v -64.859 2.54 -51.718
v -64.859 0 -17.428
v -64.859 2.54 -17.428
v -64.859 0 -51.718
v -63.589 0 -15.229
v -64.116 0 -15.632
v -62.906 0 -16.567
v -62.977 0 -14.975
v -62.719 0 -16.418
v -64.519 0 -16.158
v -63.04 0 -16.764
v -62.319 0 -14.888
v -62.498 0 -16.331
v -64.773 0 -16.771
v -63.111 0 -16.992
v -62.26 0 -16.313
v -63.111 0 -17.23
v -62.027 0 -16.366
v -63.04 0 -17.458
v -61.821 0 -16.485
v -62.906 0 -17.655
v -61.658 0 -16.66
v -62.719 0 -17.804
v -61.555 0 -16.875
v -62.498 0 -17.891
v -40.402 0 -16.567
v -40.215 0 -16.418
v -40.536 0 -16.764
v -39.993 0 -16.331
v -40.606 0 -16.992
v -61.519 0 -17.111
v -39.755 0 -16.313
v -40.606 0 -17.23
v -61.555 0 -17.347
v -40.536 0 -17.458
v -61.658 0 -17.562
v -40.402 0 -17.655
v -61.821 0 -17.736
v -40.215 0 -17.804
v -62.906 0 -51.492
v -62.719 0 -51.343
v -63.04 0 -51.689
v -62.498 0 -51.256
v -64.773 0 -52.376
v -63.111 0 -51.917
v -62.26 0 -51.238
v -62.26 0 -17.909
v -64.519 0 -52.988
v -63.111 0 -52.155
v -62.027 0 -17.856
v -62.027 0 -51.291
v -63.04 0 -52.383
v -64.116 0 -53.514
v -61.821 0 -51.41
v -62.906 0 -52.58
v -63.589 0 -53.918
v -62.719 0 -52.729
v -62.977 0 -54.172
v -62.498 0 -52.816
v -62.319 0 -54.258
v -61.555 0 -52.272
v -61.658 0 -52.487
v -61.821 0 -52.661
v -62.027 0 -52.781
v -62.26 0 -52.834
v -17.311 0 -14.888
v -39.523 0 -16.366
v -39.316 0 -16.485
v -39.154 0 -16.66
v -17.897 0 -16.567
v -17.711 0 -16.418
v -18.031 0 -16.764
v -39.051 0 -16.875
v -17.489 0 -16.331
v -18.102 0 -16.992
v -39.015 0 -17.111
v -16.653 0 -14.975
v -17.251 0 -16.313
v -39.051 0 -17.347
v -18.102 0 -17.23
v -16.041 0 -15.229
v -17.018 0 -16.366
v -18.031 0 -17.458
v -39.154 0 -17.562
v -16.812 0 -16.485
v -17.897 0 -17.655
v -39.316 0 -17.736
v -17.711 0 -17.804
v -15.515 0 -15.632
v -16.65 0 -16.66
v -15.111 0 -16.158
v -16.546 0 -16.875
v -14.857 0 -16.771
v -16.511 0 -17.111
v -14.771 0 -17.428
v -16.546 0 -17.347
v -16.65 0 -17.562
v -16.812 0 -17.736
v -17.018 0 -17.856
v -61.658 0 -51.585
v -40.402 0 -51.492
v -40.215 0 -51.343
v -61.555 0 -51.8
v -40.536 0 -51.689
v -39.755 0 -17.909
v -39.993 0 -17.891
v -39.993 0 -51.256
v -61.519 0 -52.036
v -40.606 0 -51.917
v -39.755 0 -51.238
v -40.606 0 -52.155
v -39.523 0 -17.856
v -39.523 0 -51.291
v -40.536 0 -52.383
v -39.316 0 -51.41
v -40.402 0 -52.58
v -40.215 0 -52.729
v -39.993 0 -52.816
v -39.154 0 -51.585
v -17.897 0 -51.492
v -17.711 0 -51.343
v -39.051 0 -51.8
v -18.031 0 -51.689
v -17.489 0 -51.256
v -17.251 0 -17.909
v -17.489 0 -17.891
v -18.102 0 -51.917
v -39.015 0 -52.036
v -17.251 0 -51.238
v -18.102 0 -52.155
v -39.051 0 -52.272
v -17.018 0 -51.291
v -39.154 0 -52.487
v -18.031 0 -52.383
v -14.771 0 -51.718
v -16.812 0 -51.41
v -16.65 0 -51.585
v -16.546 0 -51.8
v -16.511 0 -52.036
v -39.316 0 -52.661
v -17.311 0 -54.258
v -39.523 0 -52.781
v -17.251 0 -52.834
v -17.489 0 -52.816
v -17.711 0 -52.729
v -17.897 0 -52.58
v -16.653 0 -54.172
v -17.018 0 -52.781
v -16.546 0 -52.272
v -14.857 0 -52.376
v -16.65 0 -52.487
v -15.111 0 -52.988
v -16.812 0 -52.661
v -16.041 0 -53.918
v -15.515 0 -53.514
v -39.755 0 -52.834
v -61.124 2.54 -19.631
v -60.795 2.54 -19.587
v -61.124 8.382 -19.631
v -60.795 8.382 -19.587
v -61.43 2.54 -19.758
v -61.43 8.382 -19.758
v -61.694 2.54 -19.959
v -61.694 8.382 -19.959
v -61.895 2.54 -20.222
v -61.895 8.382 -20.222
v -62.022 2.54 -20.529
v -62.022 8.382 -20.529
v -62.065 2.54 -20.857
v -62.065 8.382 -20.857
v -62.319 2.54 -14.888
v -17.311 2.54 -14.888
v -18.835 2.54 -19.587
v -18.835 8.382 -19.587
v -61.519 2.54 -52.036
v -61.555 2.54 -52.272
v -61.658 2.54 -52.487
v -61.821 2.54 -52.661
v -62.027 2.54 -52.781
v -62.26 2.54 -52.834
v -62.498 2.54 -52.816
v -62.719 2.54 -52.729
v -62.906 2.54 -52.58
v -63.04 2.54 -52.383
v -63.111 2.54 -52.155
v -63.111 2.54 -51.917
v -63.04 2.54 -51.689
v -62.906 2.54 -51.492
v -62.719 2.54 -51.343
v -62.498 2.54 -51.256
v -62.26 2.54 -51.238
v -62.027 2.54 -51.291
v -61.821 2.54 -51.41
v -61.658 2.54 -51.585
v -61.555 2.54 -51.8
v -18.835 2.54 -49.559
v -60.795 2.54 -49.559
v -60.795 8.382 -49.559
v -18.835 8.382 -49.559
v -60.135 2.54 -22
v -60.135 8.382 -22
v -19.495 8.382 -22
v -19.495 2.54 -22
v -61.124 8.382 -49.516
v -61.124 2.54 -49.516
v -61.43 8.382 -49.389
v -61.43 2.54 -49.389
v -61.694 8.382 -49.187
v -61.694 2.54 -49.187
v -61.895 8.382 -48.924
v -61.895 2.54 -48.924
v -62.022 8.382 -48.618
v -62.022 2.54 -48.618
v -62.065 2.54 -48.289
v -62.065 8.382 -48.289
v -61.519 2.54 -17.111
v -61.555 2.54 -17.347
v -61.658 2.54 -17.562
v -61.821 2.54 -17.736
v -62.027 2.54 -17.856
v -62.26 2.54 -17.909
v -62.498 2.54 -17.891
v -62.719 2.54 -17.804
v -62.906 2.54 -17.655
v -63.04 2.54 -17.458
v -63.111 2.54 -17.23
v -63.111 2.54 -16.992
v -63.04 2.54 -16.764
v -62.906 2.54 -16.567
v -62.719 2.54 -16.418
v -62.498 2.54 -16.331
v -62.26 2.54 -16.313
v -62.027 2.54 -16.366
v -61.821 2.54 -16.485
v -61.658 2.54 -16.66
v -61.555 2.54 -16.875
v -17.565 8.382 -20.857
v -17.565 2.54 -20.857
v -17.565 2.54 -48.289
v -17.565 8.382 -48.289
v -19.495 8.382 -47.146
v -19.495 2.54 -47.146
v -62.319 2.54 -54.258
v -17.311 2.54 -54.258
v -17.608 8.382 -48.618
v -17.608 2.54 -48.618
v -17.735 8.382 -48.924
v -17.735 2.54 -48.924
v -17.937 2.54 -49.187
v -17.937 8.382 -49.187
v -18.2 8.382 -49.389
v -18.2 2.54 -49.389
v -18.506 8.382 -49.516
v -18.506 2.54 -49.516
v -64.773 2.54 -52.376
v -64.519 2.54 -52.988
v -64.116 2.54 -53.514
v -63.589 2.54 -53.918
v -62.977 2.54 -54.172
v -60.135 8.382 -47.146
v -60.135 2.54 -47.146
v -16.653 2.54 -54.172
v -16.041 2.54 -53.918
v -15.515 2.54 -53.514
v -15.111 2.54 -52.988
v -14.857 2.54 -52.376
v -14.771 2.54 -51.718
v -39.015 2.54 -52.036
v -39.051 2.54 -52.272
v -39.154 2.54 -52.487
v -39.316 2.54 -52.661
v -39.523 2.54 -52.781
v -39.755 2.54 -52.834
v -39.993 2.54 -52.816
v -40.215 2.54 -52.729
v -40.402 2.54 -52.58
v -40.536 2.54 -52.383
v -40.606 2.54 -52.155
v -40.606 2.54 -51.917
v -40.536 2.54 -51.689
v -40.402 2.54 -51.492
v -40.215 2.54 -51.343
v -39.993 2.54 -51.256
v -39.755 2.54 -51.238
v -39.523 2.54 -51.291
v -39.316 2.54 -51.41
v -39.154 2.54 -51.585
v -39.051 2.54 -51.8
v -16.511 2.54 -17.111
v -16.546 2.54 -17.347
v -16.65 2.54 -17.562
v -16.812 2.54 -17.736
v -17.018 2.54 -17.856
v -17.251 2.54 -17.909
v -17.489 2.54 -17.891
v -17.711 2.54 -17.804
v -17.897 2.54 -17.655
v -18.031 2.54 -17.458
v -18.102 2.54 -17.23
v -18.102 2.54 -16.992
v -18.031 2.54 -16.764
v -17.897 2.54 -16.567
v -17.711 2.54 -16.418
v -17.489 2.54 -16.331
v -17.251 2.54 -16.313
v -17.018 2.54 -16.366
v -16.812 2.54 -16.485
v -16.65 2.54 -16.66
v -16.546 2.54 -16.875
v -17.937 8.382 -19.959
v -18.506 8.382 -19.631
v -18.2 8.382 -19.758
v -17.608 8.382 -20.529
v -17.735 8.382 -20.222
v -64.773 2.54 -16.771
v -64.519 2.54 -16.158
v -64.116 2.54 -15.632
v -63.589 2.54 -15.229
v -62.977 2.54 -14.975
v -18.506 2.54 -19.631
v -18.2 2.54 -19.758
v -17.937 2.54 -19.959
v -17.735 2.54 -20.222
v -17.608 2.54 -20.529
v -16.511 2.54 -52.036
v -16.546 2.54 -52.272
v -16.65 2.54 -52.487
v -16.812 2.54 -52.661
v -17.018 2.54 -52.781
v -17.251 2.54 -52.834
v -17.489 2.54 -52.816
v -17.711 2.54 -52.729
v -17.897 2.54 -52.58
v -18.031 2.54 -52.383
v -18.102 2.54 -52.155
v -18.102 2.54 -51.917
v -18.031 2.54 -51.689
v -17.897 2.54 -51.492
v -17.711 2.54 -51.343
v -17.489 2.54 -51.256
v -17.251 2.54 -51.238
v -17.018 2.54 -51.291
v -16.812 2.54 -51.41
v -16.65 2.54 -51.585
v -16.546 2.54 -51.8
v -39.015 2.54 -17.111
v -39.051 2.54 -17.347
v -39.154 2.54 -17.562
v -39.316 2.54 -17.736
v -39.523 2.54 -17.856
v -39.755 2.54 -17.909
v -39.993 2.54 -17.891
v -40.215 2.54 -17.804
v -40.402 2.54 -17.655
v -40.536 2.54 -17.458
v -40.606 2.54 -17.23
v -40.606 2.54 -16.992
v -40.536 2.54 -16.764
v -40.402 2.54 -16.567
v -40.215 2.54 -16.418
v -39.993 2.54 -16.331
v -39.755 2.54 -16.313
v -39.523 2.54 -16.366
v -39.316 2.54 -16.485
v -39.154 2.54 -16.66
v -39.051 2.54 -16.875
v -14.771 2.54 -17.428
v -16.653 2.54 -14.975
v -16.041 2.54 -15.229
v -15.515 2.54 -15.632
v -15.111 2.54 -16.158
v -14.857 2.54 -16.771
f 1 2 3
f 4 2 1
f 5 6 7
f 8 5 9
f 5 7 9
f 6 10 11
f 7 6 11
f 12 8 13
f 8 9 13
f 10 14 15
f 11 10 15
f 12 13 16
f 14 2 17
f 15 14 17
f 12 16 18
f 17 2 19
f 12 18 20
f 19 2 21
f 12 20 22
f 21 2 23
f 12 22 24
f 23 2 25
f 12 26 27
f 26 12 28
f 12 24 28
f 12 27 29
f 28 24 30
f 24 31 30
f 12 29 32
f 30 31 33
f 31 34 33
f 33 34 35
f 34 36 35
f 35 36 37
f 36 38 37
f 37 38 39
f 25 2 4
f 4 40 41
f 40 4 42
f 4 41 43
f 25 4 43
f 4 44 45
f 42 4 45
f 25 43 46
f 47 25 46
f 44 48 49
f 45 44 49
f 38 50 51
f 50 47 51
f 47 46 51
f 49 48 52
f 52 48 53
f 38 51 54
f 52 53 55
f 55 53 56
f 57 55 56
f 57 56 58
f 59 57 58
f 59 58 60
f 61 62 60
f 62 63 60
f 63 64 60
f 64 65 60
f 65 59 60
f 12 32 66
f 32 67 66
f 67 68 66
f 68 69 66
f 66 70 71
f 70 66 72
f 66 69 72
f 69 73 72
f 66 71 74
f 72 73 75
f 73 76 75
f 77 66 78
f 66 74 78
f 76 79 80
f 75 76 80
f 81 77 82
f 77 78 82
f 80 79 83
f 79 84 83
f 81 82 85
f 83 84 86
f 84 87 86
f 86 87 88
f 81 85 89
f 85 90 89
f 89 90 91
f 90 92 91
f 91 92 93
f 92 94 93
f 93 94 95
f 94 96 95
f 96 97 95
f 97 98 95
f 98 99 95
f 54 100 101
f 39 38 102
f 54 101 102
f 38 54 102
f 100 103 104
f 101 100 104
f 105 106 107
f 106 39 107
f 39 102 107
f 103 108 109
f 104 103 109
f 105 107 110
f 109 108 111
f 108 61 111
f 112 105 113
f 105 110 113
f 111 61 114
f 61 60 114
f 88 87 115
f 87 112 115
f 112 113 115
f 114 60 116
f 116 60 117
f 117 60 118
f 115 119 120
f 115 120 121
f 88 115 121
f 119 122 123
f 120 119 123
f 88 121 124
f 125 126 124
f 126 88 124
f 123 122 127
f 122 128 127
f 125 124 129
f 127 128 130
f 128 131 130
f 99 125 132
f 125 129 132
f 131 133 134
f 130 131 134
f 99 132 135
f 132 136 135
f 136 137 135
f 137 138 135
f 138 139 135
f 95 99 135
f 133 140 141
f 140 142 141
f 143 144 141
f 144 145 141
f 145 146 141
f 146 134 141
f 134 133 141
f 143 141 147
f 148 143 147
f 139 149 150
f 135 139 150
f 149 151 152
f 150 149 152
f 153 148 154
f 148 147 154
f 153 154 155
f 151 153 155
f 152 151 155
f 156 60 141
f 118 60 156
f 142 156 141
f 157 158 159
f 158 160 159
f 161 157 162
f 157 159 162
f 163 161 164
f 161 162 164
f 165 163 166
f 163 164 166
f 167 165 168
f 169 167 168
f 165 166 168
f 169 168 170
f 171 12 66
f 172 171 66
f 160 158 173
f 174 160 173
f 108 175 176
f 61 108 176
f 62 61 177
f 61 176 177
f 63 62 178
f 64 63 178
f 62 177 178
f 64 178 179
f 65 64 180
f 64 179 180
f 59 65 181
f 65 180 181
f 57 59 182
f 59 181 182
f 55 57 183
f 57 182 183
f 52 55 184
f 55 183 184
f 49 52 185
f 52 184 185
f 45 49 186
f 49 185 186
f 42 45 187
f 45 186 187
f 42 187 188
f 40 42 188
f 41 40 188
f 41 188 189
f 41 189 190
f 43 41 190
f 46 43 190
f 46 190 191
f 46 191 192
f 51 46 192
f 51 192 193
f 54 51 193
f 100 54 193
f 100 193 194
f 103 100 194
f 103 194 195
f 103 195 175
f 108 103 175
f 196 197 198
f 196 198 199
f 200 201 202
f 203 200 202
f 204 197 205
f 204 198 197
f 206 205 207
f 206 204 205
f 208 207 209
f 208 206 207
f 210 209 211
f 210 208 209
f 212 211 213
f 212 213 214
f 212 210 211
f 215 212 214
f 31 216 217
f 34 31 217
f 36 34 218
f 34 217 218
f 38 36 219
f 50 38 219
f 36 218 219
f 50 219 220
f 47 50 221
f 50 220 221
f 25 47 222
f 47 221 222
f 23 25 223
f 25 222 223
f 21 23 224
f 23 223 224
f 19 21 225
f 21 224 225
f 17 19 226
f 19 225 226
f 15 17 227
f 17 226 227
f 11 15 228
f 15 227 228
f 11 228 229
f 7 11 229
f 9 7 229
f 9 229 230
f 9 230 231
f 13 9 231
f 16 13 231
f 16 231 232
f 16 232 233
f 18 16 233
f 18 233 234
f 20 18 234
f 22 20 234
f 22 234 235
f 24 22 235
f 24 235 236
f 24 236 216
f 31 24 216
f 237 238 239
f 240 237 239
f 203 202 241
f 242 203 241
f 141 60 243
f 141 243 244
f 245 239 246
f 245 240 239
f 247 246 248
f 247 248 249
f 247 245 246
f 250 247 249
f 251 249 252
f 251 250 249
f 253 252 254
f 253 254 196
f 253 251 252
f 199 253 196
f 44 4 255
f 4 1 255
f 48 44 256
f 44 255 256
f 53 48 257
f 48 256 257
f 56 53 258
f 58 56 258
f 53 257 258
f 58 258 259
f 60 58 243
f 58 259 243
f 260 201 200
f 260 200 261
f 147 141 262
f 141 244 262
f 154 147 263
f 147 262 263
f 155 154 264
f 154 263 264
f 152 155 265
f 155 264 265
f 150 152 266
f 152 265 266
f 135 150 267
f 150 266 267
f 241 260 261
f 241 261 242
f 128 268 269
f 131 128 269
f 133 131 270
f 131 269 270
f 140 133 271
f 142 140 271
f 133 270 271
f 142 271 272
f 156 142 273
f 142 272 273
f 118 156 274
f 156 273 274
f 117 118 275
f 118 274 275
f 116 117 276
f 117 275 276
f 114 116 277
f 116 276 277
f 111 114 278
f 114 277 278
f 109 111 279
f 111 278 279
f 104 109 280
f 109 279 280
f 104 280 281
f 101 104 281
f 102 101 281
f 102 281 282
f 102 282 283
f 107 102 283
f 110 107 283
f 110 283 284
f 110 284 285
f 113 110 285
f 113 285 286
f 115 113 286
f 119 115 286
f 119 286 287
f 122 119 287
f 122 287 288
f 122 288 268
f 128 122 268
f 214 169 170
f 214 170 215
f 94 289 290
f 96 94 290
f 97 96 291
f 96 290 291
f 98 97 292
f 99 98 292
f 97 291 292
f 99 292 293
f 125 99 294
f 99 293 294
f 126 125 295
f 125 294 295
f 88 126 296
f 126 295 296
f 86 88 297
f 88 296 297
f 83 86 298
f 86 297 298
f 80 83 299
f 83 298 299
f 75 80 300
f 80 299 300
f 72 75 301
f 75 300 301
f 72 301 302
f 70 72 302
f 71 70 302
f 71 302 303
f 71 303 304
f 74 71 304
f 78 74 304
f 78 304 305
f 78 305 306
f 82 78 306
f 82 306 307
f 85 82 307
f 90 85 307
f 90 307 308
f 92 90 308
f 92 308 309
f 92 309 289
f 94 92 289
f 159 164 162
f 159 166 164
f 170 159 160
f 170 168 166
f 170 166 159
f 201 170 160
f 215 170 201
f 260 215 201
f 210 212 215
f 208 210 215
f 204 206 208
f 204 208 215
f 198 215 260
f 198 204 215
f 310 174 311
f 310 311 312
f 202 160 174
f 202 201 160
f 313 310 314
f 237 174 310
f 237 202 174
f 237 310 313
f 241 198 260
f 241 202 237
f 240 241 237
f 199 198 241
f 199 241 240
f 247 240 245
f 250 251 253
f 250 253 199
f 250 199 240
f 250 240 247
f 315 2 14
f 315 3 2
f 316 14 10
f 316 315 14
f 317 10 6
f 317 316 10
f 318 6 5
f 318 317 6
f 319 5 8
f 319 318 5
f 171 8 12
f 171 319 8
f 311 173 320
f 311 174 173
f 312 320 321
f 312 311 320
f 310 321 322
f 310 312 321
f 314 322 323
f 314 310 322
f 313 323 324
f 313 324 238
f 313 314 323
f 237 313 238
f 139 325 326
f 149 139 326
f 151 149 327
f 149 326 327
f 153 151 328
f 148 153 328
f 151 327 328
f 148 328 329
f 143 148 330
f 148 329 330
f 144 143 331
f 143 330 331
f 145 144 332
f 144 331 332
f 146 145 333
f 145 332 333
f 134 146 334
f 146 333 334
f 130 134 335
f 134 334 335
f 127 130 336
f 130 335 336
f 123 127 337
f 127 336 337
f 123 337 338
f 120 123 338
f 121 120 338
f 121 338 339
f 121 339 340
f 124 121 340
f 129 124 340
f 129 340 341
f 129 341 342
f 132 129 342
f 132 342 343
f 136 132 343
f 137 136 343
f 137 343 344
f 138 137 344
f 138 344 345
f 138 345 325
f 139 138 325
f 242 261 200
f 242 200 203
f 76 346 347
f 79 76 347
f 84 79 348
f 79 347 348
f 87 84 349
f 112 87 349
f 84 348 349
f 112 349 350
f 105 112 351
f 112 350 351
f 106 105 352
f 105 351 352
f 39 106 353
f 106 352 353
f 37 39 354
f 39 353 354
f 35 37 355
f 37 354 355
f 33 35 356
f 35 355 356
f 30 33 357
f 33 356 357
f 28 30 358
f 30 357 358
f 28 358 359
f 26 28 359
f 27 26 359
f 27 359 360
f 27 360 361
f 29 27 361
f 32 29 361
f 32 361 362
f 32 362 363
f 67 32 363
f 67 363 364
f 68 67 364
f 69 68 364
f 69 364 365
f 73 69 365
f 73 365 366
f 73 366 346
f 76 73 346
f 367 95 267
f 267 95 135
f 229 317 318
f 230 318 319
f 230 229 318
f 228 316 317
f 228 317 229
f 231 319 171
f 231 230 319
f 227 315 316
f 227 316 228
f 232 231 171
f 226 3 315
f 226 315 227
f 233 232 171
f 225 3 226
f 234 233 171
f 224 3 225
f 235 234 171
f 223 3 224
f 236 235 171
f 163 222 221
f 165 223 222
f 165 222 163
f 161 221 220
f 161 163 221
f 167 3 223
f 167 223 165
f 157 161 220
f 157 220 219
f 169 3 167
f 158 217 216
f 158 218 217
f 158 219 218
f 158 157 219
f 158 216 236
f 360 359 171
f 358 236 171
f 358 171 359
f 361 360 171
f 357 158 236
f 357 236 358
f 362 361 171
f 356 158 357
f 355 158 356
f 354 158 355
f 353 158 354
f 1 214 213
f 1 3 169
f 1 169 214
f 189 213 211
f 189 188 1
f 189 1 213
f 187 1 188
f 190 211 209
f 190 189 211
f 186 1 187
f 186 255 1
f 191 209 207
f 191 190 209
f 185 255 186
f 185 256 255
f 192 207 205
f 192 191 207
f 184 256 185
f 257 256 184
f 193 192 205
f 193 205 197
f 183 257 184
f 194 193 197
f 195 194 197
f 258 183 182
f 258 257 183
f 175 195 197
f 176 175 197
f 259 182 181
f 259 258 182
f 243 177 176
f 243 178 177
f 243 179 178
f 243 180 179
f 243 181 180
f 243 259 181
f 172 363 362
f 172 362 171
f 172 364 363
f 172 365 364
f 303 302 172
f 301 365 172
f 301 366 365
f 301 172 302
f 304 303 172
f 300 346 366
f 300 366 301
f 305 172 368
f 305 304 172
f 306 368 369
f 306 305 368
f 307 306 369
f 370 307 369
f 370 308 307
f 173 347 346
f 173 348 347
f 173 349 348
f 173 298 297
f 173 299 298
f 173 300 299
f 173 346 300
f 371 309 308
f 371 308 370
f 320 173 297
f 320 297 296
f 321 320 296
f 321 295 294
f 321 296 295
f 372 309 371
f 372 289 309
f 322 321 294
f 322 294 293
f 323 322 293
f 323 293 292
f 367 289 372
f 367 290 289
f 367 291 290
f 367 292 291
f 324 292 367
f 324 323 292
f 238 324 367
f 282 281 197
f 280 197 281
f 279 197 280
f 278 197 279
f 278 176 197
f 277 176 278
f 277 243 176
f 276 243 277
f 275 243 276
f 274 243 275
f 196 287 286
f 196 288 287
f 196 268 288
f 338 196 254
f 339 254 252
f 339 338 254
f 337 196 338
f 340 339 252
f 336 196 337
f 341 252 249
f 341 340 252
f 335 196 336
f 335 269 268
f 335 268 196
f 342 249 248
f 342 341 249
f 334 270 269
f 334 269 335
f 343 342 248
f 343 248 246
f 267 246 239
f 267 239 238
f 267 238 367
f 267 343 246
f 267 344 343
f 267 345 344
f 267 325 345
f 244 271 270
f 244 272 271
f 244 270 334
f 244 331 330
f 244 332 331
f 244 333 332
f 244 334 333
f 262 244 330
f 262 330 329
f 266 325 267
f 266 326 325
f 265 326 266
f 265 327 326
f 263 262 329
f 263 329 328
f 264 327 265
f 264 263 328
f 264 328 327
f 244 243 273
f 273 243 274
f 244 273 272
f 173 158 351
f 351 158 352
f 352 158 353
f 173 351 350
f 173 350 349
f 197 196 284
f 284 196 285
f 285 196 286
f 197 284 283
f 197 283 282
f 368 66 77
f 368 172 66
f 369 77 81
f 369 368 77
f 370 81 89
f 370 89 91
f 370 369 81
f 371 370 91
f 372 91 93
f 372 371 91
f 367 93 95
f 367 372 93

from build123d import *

# Parameters (mm, degrees)
SKETCH1_W                  = 50.0888
SKETCH1_H                  = 39.37
BOSS_EXTRUDE1_DEPTH        = 2.54
SKETCH2_W                  = 44.5008
SKETCH2_H                  = 29.972
BOSS_EXTRUDE2_DEPTH        = 5.842
FILLET1_R                  = 2.54
FILLET2_R                  = 1.27
F_1_6_1_6_DIAMETER_HOLE1_D = 1.6
SKETCH5_W                  = 40.64
SKETCH5_H                  = 25.146
CUT_EXTRUDE1_DEPTH         = 5.842


with BuildPart() as part:
    # Sketch1 → Boss-Extrude1 (new body)
    with BuildSketch(Plane(origin=(0, 0, 0), x_dir=(1, 0, 0), z_dir=(0, 1, 0))):
        with Locations((-39.815086883, 34.57343553)):
            Rectangle(SKETCH1_W, SKETCH1_H)
    extrude(amount=BOSS_EXTRUDE1_DEPTH)

    # Sketch2 → Boss-Extrude2 (add)
    with BuildSketch(Plane(origin=(0, 2.54, 0), x_dir=(1, 0, 0), z_dir=(0, 1, 0))):
        with Locations((-39.815086883, 34.57343553)):
            Rectangle(SKETCH2_W, SKETCH2_H)
    extrude(amount=BOSS_EXTRUDE2_DEPTH)

    # Fillet1
    fillet1_edges = [part.edges().sort_by_distance(p)[0] for p in [
        (-64.859486883, 1.27, -54.25843553),
        (-14.770686883, 1.27, -54.25843553),
        (-14.770686883, 1.27, -14.88843553),
        (-64.859486883, 1.27, -14.88843553),
    ]]
    fillet(fillet1_edges, radius=FILLET1_R)

    # Fillet2
    fillet2_edges = [part.edges().sort_by_distance(p)[0] for p in [
        (-62.065486883, 5.461, -49.55943553),
        (-62.065486883, 5.461, -19.58743553),
        (-17.564686883, 5.461, -19.58743553),
        (-17.564686883, 5.461, -49.55943553),
    ]]
    fillet(fillet2_edges, radius=FILLET2_R)

    # Ø1.6 (1.6) Diameter Hole1 (through all)
    with Locations(Plane(origin=(0, 0, 0), x_dir=(-1, 0, 0), z_dir=(0, -1, 0))):
        with Locations((62.319486883, 17.11093553), (39.815086883, 17.11093553), (17.310686883, 17.11093553), (17.310686883, 52.03593553), (39.815086883, 52.03593553), (62.319486883, 52.03593553)):
            Hole(F_1_6_1_6_DIAMETER_HOLE1_D / 2)

    # Sketch5 → Cut-Extrude1 (cut)
    with BuildSketch(Plane(origin=(0, 8.382, 0), x_dir=(1, 0, 0), z_dir=(0, 1, 0))):
        with Locations((-39.815086883, 34.57343553)):
            Rectangle(SKETCH5_W, SKETCH5_H)
    extrude(amount=-CUT_EXTRUDE1_DEPTH, mode=Mode.SUBTRACT)


solid = part.part
